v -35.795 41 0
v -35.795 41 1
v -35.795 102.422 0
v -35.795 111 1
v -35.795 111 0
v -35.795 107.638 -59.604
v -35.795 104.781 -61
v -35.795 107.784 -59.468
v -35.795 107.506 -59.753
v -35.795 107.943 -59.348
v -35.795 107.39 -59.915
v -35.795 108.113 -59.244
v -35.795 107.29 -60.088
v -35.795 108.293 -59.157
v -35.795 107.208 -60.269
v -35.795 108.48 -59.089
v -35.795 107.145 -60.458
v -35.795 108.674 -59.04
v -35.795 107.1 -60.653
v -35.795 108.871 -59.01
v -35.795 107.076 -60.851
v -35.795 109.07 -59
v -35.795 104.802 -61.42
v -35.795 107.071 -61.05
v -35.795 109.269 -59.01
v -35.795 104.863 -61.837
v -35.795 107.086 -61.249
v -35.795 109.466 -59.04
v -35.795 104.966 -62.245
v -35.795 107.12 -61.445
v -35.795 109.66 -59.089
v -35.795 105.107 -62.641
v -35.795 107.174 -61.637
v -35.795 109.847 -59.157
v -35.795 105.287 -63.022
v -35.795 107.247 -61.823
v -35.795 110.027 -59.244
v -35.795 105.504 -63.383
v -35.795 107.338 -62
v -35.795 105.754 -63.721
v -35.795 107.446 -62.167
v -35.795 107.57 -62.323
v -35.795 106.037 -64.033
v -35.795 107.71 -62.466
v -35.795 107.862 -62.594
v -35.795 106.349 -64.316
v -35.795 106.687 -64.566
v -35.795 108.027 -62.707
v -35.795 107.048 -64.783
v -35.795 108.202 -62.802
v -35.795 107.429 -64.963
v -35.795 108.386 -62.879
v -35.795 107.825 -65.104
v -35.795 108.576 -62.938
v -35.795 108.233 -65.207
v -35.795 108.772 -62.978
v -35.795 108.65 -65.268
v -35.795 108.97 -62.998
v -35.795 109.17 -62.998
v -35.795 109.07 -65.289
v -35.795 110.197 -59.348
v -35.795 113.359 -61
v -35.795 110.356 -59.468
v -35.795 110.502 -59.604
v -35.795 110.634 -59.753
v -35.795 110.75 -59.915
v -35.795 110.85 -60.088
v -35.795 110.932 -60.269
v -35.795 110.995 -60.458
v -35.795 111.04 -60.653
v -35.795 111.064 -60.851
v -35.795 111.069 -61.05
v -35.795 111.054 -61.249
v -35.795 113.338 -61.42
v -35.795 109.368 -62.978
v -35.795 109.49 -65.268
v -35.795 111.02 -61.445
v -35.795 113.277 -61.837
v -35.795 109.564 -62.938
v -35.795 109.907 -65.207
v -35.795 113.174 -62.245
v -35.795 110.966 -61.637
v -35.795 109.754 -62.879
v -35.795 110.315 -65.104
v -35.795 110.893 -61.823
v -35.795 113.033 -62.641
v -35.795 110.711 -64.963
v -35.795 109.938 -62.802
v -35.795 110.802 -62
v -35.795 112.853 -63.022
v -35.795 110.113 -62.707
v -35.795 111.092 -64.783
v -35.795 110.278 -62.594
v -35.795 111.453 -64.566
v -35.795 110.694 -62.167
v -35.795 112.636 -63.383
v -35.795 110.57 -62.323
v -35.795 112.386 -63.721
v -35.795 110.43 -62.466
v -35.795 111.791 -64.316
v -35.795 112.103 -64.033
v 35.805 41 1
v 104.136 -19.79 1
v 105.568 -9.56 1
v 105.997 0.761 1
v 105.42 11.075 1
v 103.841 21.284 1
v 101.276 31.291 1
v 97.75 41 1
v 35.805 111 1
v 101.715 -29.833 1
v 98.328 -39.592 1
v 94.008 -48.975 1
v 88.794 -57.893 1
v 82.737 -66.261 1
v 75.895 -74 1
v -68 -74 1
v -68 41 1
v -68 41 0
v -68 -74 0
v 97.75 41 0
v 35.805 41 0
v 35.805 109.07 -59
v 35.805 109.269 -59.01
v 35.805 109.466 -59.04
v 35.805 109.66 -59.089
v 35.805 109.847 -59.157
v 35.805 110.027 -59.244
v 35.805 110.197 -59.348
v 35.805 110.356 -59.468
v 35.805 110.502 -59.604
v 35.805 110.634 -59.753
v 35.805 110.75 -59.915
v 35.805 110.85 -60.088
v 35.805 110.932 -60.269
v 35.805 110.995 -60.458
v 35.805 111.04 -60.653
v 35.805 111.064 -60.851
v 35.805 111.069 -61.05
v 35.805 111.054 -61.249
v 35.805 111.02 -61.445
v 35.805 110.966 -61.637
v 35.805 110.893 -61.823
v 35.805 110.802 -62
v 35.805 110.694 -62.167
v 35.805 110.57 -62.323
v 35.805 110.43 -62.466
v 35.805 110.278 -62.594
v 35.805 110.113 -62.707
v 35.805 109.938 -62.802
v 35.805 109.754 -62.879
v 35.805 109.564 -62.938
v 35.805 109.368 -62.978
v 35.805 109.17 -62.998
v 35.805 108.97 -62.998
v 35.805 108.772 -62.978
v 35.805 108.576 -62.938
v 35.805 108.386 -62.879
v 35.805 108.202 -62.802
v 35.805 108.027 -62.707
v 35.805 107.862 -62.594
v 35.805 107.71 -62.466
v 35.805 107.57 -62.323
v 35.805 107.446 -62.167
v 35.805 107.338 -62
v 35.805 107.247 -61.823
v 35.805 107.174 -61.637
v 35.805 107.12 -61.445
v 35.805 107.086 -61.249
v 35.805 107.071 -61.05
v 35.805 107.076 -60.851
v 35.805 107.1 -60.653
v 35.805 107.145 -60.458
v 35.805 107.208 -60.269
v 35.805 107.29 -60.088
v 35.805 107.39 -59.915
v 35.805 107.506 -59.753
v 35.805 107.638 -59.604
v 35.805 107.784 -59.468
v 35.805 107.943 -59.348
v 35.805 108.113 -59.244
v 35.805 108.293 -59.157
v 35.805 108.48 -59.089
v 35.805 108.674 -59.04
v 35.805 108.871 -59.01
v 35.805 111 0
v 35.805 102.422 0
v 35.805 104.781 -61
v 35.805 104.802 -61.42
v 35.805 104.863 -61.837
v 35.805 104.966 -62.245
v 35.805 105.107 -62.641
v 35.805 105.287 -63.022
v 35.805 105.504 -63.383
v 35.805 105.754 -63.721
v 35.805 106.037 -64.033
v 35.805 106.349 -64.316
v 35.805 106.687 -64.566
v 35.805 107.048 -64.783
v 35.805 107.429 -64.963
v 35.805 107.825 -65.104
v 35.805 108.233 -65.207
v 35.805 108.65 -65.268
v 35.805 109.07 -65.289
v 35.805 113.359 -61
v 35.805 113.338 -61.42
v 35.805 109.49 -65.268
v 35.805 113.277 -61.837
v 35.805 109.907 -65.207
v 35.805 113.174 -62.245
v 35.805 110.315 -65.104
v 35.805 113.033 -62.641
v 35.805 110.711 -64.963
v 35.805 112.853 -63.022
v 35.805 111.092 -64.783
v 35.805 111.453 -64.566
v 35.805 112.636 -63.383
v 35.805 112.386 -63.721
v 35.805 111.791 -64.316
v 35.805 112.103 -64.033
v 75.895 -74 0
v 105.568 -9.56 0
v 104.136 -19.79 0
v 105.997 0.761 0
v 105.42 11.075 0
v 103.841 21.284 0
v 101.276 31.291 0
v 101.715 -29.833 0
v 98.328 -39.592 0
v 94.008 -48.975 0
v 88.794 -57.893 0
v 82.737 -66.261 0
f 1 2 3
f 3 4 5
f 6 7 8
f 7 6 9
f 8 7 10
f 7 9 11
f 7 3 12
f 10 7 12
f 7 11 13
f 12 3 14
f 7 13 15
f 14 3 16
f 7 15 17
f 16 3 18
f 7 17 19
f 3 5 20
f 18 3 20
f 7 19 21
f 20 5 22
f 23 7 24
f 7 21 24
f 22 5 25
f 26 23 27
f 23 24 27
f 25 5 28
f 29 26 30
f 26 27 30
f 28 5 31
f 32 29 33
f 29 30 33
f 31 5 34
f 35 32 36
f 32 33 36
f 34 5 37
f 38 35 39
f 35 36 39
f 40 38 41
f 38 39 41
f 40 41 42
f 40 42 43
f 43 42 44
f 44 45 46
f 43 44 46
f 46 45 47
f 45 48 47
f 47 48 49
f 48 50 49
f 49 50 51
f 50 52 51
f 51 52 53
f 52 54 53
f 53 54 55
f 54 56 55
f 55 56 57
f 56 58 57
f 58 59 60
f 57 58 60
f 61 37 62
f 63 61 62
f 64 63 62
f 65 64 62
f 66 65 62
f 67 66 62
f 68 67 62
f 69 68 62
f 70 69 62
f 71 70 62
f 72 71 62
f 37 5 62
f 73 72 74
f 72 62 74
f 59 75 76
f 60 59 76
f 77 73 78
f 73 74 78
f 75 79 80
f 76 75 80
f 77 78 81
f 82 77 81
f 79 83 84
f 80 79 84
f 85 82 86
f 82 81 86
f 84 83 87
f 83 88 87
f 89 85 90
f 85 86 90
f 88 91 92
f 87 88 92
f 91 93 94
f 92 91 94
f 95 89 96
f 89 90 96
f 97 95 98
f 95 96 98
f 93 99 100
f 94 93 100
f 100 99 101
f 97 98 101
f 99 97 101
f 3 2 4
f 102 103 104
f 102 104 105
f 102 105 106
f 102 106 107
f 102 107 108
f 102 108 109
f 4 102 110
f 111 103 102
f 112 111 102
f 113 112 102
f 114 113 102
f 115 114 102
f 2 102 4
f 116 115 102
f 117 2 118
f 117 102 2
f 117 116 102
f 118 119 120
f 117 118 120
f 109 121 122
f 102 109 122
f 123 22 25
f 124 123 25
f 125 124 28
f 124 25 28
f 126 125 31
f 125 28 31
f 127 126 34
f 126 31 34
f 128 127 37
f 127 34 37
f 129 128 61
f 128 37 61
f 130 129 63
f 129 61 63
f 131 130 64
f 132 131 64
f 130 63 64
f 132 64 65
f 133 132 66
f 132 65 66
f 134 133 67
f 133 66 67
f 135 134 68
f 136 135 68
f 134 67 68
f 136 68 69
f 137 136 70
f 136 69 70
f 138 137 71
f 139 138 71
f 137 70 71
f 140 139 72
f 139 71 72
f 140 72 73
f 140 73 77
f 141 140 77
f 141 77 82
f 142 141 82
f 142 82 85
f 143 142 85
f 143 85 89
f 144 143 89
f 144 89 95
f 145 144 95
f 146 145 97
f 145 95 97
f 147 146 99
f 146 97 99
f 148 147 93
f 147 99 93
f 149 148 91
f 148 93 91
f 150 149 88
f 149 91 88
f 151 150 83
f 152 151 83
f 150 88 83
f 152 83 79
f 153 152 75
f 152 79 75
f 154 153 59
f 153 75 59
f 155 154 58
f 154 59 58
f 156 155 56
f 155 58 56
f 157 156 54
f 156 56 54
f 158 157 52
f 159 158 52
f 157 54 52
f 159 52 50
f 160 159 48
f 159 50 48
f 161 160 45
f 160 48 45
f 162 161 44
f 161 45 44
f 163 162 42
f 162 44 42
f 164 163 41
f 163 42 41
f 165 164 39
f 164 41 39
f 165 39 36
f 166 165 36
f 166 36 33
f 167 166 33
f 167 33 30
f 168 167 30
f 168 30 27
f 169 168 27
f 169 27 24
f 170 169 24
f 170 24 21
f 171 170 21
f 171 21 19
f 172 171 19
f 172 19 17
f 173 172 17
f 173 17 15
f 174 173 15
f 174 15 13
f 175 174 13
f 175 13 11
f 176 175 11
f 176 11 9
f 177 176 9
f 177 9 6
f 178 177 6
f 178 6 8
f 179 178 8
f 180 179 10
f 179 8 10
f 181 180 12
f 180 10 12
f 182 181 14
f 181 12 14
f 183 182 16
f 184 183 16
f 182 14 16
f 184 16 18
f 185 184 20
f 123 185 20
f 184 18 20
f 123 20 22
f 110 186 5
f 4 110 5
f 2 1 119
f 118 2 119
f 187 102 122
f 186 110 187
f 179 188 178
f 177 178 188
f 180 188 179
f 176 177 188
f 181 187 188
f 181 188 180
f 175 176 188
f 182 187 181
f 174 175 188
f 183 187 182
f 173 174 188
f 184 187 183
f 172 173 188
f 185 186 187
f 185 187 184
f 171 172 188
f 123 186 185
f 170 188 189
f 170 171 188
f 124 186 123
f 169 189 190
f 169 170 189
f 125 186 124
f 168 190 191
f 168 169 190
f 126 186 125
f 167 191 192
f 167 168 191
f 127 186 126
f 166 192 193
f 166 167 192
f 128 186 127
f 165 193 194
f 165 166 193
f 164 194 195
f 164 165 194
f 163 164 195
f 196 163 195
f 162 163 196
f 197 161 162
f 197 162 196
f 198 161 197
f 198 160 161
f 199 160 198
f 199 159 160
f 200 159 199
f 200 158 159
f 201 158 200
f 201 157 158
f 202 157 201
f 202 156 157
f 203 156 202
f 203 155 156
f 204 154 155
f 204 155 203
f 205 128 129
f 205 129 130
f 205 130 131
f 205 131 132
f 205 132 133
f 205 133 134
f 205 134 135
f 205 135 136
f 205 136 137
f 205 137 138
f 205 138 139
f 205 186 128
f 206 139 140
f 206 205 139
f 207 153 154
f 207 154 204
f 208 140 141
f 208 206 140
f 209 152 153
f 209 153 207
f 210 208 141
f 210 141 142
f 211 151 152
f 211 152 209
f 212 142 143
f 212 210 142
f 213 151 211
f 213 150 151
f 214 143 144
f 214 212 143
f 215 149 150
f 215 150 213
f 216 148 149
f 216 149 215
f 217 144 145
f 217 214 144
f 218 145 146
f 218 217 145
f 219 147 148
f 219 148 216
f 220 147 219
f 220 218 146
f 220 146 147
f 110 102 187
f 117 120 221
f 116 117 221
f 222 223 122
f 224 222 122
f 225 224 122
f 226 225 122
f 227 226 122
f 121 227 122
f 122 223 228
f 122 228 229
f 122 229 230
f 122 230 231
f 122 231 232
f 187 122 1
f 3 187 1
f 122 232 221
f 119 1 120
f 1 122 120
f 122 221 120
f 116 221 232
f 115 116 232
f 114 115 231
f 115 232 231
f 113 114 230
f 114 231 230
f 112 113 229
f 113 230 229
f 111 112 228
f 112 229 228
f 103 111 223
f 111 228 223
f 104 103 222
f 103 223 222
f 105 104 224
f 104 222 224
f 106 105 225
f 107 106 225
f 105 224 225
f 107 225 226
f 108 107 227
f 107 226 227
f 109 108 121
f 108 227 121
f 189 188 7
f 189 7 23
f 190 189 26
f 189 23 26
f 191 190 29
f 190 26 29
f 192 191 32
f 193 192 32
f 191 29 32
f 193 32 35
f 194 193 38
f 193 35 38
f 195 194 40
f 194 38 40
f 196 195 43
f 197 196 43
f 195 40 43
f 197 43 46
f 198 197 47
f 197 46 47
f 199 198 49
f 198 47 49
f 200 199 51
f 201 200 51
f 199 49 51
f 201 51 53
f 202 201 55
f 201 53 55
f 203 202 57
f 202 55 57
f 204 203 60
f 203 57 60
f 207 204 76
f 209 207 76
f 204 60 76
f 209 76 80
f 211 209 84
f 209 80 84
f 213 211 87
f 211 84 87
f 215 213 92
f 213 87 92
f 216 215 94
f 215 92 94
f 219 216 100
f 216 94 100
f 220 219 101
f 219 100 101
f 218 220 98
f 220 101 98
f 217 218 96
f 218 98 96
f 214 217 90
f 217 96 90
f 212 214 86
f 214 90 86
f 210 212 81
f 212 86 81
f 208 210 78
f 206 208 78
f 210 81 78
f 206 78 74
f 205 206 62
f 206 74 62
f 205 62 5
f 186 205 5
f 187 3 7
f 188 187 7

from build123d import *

# Parameters (mm, degrees)
ESTRUSIONE_ESTRUSIONE1_DEPTH = 1
SCHIZZO2_W                   = 71.6
SCHIZZO2_H                   = 70
ESTRUSIONE_ESTRUSIONE2_DEPTH = 1
SCHIZZO3_R                   = 2
ESTRUSIONE_ESTRUSIONE3_DEPTH = 71.6


with BuildPart() as part:
    # Schizzo1 → Estrusione-Estrusione1 (new body)
    with BuildSketch(Plane(origin=(0, 0, 0), x_dir=(-1, 0, 0), z_dir=(0, 0, 1))):
        with BuildLine():
            Line((68, -41), (68, 74))
            Line((68, 74), (-75.894663844, 74))
            ThreePointArc((-75.894663844, 74), (-104.136158772, 19.790412733), (-97.749680306, -41))
            Line((-97.749680306, -41), (68, -41))
        make_face()
    extrude(amount=ESTRUSIONE_ESTRUSIONE1_DEPTH)

    # Schizzo2 → Estrusione-Estrusione2 (add)
    with BuildSketch(Plane(origin=(0, 0, 0), x_dir=(-1, 0, 0), z_dir=(0, 0, -1))):
        with Locations((-0.004840153, 76)):
            Rectangle(SCHIZZO2_W, SCHIZZO2_H)
    extrude(amount=-ESTRUSIONE_ESTRUSIONE2_DEPTH)

    # Schizzo3 → Estrusione-Estrusione3 (add)
    with BuildSketch(Plane.ZY.offset(35.795159847)):
        with BuildLine():
            Line((-61, 113.35913787), (0, 111))
            Line((0, 111), (0, 102.42172426))
            Line((0, 102.42172426), (-61, 104.78086213))
            ThreePointArc((-61, 104.78086213), (-65.28913787, 109.07), (-61, 113.35913787))
        make_face()
        with Locations((-61, 109.07)):
            Circle(SCHIZZO3_R, mode=Mode.SUBTRACT)
    extrude(amount=-ESTRUSIONE_ESTRUSIONE3_DEPTH)


solid = part.part
